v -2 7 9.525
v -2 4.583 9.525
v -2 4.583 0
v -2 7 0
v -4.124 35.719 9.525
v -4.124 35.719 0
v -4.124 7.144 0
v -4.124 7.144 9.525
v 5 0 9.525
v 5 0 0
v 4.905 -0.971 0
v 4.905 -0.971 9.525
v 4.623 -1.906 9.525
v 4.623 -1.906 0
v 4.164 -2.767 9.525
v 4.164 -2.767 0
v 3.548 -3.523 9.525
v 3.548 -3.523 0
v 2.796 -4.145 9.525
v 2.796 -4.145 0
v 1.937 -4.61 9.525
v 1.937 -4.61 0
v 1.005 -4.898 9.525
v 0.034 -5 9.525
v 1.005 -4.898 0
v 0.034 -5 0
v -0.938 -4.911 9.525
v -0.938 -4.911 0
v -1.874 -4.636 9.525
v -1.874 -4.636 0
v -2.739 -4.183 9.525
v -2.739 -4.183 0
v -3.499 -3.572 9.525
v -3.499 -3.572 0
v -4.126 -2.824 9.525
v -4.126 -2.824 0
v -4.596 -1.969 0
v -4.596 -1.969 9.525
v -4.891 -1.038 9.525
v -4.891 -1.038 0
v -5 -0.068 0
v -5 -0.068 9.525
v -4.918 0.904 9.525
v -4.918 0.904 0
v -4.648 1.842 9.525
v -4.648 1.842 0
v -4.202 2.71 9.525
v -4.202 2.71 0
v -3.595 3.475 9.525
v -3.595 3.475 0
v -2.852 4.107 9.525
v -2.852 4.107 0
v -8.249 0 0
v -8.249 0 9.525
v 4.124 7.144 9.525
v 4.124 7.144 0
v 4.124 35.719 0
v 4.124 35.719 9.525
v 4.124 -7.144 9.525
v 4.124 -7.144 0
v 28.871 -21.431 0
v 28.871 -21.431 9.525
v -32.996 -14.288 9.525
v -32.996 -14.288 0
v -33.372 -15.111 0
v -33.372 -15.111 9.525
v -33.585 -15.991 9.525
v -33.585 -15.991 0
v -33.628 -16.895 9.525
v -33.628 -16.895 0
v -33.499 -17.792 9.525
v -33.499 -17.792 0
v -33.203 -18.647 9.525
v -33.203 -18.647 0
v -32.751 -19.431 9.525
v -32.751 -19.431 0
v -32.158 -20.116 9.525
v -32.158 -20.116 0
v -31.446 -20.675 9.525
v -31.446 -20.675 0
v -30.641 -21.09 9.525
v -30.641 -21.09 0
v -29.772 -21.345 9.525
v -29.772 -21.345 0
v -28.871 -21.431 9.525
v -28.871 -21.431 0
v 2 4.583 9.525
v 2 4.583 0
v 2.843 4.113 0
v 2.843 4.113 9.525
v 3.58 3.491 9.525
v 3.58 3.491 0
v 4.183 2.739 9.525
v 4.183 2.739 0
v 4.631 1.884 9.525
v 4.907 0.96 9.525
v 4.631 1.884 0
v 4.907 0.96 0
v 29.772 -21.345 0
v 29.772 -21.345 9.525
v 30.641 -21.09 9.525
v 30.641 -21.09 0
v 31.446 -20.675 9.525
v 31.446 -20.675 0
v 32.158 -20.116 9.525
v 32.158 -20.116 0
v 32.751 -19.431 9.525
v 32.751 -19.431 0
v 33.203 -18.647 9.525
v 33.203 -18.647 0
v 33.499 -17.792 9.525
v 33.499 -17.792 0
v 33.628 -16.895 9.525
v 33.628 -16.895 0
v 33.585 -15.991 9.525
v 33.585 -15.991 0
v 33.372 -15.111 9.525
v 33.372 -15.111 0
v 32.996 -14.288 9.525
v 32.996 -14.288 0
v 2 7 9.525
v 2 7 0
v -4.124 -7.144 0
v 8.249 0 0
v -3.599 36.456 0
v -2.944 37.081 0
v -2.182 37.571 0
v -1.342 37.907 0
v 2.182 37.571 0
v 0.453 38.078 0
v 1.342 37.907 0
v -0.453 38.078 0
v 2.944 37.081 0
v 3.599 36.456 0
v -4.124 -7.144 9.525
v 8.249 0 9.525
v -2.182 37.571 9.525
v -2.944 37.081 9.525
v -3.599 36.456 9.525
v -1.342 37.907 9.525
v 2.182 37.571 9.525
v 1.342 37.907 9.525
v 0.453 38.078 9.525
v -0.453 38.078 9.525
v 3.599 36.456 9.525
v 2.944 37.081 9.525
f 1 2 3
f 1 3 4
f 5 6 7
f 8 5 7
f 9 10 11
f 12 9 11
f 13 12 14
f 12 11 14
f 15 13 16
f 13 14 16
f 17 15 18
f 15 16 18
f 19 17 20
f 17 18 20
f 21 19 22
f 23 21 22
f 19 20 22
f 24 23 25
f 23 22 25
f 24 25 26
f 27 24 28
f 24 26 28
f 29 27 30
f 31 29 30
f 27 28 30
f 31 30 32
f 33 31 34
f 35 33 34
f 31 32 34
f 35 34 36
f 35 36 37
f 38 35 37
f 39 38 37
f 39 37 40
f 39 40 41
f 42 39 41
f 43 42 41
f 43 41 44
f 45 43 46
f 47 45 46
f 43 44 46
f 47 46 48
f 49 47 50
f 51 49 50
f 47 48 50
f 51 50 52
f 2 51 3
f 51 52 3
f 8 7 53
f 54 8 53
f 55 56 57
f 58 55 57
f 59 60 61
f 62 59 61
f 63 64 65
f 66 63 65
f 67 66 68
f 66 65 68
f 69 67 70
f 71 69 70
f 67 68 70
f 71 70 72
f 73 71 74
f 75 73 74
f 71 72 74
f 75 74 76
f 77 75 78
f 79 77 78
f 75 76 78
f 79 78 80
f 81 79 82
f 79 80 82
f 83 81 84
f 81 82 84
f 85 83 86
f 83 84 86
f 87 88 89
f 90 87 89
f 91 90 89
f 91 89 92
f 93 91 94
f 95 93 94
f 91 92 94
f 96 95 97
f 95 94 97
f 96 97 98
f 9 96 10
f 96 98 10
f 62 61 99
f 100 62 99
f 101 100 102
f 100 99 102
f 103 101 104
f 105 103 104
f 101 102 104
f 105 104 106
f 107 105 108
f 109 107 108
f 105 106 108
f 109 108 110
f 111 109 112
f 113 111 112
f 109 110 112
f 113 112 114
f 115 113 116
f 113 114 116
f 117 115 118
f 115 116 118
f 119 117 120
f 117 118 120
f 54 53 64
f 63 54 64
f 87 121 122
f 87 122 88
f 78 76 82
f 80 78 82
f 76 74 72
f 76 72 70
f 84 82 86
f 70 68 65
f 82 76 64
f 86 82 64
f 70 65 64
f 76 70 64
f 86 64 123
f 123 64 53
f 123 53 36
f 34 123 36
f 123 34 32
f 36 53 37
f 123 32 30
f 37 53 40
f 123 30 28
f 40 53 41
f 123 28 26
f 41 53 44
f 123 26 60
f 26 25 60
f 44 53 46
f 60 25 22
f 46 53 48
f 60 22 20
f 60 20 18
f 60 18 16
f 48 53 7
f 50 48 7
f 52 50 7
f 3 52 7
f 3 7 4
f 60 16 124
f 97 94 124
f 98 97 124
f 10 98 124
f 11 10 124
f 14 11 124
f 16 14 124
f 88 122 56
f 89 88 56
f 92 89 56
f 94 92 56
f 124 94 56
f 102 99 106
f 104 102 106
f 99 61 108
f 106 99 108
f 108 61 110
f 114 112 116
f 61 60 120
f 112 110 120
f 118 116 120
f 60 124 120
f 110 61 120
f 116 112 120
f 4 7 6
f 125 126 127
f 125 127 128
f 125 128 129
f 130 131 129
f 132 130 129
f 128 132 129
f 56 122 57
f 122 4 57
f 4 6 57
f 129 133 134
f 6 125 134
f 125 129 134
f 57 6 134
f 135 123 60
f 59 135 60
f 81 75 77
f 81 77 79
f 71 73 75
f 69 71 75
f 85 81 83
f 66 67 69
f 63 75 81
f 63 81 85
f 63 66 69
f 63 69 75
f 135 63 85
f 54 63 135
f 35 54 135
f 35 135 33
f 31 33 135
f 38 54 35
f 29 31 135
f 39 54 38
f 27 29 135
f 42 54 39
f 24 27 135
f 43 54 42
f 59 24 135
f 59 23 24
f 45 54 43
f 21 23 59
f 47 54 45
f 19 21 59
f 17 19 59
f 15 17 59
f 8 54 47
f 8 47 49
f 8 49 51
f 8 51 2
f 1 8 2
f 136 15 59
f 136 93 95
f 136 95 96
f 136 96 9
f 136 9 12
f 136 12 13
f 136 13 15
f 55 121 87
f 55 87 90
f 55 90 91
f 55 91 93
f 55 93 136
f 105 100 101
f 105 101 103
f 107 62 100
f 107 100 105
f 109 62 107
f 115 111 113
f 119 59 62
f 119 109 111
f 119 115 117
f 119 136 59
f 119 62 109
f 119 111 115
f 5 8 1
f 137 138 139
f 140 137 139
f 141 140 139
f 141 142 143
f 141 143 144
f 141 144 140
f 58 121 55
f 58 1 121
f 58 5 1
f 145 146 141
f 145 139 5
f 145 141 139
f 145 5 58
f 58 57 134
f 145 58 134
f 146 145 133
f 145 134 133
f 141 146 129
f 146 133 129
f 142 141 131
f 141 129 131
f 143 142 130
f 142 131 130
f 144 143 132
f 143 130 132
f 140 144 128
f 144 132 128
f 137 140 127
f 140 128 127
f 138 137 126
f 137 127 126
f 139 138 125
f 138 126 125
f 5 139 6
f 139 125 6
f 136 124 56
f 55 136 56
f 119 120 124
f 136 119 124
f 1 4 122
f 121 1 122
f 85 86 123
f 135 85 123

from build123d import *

# Parameters (mm, degrees)
F2_DEPTH = 9.525


# Not quite as in the source:
# - a variable given as a bare number and used for a length is read in inches; the dataset says mm whatever the document's units were


with BuildPart() as f2:
    # F1 (on Top) → F2 (new body)
    with BuildSketch(Plane.XY):
        with BuildLine():
            Line((4.1244459855, 7.14375), (4.1244459855, 35.71875))
            ThreePointArc((4.1244459855, 35.71875), (0, 38.1), (-4.1244459855, 35.71875))
            Line((-4.1244459855, 35.71875), (-4.1244459855, 7.14375))
            Line((-4.1244459855, 7.14375), (-8.248891971, 0))
            Line((-8.248891971, 0), (-32.9955678842, -14.2875))
            ThreePointArc((-32.9955678842, -14.2875), (-32.9955678842, -19.05), (-28.8711218987, -21.43125))
            Line((-28.8711218987, -21.43125), (-4.1244459855, -7.14375))
            Line((-4.1244459855, -7.14375), (4.1244459855, -7.14375))
            Line((4.1244459855, -7.14375), (28.8711218987, -21.43125))
            ThreePointArc((28.8711218987, -21.43125), (32.9955678842, -19.05), (32.9955678842, -14.2875))
            Line((32.9955678842, -14.2875), (8.248891971, 0))
            Line((8.248891971, 0), (4.1244459855, 7.14375))
        make_face()
        with BuildLine():
            ThreePointArc((2, 4.582575695), (4.1833001327, 2.7386127875), (5, 0))
            ThreePointArc((5, 0), (-2.7386127875, -4.1833001327), (-2, 4.582575695))
            Line((-2, 4.582575695), (-2, 7))
            Line((-2, 7), (2, 7))
            Line((2, 7), (2, 4.582575695))
        make_face(mode=Mode.SUBTRACT)
    extrude(amount=F2_DEPTH)


solid = f2.part
